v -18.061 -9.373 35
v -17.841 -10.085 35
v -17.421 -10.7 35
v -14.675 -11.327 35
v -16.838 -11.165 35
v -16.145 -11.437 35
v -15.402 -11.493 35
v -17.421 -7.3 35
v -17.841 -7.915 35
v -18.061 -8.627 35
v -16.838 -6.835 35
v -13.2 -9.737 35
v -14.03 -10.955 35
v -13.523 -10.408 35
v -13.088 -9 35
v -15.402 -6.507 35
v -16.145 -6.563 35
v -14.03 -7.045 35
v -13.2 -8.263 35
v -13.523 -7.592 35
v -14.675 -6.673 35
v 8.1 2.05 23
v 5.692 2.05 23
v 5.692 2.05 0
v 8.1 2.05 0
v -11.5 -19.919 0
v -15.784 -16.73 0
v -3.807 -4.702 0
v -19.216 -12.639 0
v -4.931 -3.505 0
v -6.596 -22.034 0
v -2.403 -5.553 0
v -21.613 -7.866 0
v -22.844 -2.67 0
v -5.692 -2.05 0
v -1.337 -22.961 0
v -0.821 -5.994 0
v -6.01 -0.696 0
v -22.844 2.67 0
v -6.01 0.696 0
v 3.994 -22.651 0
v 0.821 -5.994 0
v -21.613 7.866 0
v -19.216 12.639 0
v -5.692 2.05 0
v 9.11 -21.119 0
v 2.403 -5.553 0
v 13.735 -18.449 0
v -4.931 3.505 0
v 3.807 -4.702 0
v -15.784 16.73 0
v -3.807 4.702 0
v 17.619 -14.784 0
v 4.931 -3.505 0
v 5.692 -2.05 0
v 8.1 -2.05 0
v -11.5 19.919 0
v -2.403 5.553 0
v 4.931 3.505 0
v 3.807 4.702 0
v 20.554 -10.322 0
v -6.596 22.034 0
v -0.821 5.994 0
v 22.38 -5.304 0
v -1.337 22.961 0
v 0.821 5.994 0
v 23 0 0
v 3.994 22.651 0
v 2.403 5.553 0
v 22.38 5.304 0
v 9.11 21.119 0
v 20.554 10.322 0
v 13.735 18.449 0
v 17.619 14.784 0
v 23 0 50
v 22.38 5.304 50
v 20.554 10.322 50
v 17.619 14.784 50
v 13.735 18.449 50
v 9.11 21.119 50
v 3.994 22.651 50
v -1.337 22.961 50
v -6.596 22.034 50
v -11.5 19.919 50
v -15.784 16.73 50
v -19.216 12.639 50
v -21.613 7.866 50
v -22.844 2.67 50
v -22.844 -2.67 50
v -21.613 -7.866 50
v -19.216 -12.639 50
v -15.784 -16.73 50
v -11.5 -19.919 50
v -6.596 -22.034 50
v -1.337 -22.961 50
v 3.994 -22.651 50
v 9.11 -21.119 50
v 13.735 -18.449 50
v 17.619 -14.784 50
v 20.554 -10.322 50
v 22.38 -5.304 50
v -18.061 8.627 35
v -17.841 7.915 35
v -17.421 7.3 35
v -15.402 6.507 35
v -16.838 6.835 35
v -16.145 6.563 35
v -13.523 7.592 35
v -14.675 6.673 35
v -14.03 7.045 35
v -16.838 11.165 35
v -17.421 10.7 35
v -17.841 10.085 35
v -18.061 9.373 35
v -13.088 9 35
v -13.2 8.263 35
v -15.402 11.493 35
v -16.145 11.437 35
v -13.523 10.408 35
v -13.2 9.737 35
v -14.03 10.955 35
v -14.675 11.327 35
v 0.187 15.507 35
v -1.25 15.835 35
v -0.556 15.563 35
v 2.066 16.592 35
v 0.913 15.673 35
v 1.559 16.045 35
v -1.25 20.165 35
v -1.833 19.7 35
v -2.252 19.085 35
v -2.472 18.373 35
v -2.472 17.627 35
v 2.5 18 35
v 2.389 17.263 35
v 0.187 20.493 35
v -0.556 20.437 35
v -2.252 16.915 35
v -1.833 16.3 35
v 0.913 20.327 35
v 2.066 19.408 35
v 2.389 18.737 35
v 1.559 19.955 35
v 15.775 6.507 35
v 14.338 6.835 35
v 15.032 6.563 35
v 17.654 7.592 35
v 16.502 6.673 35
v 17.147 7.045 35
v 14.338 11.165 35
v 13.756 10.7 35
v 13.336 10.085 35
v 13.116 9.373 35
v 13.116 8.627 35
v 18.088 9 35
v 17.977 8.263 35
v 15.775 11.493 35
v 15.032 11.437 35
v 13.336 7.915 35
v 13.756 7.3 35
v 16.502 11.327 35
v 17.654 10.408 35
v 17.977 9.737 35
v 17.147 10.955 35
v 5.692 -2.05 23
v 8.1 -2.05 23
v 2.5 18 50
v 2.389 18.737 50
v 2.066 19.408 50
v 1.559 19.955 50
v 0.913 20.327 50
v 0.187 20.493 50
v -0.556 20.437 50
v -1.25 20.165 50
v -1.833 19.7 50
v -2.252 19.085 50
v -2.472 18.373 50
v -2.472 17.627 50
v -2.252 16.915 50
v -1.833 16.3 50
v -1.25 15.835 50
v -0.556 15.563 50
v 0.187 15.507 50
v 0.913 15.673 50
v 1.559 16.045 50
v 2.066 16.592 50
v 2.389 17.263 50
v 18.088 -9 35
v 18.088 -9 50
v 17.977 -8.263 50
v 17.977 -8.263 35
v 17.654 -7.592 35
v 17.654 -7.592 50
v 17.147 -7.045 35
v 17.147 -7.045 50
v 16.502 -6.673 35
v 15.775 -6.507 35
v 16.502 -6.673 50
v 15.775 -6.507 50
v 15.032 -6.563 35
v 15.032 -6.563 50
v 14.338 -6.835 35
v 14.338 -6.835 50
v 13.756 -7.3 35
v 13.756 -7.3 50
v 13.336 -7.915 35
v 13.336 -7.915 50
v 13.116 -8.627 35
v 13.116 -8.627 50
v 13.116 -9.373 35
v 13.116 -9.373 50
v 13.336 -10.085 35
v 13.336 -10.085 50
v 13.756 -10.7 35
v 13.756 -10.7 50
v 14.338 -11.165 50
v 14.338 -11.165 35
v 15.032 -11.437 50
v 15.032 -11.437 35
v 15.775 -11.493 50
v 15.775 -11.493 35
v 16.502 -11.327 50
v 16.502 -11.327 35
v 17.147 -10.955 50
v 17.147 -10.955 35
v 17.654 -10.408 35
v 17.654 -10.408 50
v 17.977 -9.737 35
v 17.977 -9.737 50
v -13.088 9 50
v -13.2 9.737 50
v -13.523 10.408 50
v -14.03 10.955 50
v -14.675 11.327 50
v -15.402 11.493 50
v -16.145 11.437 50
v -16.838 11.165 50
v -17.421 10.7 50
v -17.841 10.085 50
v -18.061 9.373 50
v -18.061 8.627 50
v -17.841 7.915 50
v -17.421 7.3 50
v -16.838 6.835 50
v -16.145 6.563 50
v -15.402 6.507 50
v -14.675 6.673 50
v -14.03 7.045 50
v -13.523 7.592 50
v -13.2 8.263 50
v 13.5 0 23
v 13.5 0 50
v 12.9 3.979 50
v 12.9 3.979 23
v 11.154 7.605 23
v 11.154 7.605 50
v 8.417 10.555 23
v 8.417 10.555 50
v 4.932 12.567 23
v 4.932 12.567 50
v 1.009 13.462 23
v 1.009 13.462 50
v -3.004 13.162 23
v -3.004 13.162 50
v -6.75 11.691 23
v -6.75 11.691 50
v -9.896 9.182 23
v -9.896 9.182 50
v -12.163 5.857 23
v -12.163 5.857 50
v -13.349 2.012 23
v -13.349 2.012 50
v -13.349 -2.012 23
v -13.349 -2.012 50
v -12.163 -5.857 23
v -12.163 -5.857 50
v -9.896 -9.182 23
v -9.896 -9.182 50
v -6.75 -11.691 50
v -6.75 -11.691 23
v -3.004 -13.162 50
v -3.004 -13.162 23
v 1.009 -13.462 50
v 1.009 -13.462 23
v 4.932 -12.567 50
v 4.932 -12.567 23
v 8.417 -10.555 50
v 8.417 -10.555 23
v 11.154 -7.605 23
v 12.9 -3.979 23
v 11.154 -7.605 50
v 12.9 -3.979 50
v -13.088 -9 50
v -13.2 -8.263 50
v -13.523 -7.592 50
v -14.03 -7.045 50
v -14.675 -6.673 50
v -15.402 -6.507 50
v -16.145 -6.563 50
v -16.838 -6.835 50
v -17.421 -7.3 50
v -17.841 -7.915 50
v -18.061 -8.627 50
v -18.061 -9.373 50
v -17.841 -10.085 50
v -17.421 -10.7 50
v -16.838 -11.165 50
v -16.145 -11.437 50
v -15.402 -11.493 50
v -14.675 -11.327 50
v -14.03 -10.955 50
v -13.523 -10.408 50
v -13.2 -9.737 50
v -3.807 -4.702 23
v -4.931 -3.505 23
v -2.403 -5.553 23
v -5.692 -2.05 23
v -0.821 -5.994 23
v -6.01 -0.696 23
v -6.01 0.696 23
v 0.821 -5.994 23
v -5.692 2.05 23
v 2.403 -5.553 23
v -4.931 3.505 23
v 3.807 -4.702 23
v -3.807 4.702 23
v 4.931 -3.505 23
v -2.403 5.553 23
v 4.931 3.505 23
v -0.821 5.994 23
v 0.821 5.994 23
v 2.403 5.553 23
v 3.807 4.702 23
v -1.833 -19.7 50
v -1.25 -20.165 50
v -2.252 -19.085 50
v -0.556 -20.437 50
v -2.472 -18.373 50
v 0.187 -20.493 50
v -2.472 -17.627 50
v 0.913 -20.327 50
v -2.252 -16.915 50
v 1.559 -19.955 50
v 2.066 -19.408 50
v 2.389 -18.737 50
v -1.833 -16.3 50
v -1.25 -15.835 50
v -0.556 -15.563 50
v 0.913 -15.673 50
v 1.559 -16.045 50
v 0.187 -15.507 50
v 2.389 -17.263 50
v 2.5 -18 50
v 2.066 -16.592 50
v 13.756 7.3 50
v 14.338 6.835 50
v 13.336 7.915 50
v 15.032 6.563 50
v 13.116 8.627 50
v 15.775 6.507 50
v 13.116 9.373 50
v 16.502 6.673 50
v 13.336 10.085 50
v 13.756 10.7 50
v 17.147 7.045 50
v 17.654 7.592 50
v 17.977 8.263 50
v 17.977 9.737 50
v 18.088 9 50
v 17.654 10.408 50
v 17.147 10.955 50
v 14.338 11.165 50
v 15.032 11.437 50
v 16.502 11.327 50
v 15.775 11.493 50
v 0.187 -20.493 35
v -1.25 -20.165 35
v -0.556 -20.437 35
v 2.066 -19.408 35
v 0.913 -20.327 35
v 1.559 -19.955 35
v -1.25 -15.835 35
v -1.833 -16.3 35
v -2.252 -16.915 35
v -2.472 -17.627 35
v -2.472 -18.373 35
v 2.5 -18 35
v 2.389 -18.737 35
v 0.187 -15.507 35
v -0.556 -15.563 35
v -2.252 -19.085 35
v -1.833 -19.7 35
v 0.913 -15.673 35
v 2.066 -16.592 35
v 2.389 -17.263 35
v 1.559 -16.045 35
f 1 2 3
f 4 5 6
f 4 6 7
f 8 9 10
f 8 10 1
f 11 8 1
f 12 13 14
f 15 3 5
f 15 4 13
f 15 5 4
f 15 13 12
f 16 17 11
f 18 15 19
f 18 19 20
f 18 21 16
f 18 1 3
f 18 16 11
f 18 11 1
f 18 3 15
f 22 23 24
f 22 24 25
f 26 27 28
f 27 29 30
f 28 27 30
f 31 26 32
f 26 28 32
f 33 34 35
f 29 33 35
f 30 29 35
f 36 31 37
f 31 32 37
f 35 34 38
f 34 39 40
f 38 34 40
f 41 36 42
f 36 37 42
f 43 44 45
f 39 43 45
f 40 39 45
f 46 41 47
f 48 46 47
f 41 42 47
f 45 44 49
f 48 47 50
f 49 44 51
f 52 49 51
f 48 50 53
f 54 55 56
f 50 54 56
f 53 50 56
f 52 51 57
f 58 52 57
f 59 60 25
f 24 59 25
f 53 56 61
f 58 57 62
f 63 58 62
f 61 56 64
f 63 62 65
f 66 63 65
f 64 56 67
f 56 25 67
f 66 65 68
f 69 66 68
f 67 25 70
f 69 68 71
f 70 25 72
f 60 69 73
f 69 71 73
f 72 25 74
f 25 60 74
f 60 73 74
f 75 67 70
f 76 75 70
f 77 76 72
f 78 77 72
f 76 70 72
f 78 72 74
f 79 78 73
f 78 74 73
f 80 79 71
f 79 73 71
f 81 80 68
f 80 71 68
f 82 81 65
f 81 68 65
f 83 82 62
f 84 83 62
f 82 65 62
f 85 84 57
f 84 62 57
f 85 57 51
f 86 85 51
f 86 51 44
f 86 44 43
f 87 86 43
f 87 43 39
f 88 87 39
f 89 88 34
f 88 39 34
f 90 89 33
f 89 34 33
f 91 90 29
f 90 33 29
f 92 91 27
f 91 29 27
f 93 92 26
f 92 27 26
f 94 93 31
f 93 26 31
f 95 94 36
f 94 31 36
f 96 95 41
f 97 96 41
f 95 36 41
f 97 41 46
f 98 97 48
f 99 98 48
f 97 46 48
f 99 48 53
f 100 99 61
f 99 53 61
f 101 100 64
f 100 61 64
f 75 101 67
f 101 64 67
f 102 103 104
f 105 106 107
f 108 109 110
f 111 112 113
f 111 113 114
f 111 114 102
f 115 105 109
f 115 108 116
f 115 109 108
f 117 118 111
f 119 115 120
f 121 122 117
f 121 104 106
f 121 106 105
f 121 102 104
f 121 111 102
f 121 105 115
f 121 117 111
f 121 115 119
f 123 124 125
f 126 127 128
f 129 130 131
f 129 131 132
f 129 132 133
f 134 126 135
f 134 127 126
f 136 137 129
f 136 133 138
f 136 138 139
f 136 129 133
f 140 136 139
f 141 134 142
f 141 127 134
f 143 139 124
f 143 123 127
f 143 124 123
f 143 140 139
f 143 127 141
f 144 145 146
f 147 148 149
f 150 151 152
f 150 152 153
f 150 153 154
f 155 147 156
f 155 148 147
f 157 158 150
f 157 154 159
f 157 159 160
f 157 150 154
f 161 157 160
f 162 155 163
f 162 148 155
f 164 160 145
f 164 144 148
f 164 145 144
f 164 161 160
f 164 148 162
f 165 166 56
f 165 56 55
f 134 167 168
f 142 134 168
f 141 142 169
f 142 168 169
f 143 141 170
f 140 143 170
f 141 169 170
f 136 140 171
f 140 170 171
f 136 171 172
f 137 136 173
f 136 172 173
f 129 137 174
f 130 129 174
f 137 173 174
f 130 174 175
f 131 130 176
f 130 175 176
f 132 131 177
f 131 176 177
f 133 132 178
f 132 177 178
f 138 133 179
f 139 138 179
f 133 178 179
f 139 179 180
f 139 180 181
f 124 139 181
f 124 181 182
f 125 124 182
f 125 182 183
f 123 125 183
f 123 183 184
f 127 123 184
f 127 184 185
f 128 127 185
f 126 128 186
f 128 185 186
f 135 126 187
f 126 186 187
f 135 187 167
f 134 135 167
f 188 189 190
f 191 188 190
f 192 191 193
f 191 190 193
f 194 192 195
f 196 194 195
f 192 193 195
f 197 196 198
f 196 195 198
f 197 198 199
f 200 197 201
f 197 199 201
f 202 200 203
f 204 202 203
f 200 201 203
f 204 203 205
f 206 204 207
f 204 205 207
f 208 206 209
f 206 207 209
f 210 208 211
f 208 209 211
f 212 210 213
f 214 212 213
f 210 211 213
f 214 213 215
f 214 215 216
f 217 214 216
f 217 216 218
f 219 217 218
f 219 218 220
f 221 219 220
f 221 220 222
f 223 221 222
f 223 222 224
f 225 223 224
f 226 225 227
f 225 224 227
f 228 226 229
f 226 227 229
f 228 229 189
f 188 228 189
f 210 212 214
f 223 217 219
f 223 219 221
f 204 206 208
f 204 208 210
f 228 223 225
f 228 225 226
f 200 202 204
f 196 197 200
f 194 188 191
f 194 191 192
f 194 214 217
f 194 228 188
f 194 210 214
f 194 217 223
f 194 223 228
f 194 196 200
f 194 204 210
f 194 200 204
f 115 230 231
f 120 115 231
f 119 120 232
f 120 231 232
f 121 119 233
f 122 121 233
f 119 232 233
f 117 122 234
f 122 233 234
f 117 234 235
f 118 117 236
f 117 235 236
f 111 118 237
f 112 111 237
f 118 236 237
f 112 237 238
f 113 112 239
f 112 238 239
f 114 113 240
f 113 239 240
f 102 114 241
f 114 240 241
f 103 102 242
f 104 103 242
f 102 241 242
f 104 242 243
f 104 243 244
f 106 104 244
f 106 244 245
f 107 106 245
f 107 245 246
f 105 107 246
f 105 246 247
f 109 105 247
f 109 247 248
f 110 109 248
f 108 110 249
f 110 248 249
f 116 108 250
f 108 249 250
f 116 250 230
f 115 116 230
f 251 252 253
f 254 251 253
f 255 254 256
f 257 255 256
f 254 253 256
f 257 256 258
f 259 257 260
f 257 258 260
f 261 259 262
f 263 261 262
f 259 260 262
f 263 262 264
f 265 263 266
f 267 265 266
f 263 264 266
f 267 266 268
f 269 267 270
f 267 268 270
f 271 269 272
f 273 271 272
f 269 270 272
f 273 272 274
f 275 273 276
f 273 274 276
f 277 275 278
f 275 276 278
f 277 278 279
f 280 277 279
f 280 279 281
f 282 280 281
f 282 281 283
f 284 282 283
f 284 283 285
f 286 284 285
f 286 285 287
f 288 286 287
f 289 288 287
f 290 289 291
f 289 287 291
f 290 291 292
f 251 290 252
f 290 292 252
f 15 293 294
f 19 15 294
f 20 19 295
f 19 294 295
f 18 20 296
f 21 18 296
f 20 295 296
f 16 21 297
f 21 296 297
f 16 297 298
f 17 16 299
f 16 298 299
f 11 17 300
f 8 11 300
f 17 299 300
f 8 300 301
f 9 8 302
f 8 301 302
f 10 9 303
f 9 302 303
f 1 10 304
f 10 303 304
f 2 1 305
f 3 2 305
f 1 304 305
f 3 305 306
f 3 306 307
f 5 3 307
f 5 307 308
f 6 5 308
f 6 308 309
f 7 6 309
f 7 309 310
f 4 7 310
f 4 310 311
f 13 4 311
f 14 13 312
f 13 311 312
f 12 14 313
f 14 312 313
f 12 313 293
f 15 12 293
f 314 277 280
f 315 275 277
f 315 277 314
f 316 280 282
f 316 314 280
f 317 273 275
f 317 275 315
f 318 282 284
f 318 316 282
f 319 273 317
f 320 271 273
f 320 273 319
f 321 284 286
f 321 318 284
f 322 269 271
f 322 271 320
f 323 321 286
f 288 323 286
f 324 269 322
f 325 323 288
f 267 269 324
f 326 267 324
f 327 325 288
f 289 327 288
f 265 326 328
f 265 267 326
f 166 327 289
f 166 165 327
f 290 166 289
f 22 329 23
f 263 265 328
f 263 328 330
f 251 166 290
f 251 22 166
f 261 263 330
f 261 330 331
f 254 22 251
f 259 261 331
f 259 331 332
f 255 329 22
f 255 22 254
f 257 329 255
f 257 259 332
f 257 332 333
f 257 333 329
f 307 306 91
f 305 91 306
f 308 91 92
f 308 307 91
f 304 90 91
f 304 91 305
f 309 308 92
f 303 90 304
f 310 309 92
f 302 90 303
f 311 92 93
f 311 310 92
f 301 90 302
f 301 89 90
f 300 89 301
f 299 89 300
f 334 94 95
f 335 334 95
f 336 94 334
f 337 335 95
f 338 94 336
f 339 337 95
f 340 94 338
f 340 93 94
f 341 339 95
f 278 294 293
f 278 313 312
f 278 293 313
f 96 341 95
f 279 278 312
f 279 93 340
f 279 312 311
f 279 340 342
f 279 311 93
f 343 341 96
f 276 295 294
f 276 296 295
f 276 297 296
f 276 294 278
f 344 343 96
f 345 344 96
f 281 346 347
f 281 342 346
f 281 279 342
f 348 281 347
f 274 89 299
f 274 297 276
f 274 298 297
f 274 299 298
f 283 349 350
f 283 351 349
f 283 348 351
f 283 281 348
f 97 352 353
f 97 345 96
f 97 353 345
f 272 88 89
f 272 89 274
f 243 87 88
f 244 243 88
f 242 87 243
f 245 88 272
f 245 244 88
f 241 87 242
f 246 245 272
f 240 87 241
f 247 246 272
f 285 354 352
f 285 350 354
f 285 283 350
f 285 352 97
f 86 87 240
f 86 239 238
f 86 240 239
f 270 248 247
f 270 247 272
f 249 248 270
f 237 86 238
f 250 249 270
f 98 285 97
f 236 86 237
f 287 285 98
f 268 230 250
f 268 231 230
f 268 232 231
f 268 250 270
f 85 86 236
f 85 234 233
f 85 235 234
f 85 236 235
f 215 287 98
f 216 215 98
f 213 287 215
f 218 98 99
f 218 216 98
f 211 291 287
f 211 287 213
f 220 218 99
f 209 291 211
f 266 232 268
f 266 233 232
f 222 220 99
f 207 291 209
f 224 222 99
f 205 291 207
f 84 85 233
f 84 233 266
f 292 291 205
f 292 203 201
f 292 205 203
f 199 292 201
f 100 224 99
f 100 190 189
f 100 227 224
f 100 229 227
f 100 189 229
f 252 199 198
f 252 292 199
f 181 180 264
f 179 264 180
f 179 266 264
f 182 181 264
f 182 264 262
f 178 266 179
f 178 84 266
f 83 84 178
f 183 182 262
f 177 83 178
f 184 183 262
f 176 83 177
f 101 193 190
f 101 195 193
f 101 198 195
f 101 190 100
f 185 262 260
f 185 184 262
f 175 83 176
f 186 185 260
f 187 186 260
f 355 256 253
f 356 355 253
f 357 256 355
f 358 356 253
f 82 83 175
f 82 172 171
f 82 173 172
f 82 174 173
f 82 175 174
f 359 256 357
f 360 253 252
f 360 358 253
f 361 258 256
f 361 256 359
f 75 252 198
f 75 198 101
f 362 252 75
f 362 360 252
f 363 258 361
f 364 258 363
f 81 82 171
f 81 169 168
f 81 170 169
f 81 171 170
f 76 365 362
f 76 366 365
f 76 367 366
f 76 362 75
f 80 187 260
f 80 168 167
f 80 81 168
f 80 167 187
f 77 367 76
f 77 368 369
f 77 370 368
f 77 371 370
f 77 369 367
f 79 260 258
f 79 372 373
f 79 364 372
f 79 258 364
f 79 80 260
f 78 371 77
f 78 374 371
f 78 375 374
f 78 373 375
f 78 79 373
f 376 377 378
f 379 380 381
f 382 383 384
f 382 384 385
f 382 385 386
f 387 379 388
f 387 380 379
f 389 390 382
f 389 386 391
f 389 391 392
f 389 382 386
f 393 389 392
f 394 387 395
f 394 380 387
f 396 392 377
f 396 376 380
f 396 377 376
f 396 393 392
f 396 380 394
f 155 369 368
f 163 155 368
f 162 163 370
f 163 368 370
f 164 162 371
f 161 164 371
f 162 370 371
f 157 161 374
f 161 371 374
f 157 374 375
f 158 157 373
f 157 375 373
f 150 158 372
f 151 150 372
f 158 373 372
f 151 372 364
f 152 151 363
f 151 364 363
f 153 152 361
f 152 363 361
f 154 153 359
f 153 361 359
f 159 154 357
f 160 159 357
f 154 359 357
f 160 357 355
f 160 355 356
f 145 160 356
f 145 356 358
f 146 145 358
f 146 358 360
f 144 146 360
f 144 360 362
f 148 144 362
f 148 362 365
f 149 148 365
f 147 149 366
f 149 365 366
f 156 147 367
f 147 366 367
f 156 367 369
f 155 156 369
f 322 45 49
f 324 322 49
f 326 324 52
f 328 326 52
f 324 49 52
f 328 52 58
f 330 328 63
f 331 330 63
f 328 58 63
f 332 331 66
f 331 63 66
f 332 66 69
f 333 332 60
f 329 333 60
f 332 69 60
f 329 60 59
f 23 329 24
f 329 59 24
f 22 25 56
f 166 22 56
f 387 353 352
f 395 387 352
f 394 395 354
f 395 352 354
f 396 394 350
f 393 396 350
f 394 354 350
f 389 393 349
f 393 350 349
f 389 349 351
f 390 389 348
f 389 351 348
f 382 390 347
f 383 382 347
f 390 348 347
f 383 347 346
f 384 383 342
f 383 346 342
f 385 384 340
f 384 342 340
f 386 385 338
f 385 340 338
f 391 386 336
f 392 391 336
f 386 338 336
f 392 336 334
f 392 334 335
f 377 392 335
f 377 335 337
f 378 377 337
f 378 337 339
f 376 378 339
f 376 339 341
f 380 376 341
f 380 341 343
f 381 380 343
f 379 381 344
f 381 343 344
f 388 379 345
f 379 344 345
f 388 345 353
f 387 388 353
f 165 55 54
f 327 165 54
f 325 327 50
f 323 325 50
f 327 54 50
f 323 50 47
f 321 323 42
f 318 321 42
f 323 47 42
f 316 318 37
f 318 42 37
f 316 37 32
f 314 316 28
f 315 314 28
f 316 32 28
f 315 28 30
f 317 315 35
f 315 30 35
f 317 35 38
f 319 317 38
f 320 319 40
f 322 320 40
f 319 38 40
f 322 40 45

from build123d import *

# Parameters (mm, degrees)
F0_R     = 23
F3_DEPTH = 50
F4_R     = 13.5
F1_DEPTH = 27
F5_R     = 2.5
F2_DEPTH = 15


with BuildPart() as f3:
    # F0 (on Top) → F3 (new body)
    with BuildSketch(Plane.XY):
        Circle(F0_R)
        with BuildLine():
            ThreePointArc((-5.6921, 2.05), (0, 6.05), (5.6921, 2.05))
            Line((5.6921, 2.05), (8.1, 2.05))
            Line((8.1, 2.05), (8.1, -2.05))
            Line((8.1, -2.05), (5.6921, -2.05))
            ThreePointArc((5.6921, -2.05), (0, -6.05), (-5.6921, -2.05))
            Line((-5.6921, -2.05), (-8.1, -2.05))
            Line((-8.1, -2.05), (-8.1, 2.05))
            Line((-8.1, 2.05), (-5.6921, 2.05))
        make_face(mode=Mode.SUBTRACT)
        with BuildLine():
            ThreePointArc((-5.6921, -2.05), (-6.05, 0), (-5.6921, 2.05))
            Line((-5.6921, 2.05), (-8.1, 2.05))
            Line((-8.1, 2.05), (-8.1, -2.05))
            Line((-8.1, -2.05), (-5.6921, -2.05))
        make_face()
    extrude(amount=F3_DEPTH)

    # F4 (on face) → F1 (cut)
    with BuildSketch(Plane.XY.offset(50)):
        Circle(F4_R)
    extrude(amount=-F1_DEPTH, mode=Mode.SUBTRACT)

    # F5 (on face) → F2 (cut)
    with BuildSketch(Plane.XY.offset(50)):
        with Locations((15.588457, 9)):
            Circle(F5_R)
        with Locations((0, 18)):
            Circle(F5_R)
        with Locations((-15.588457, 9)):
            Circle(F5_R)
        with Locations((15.588457, -9)):
            Circle(F5_R)
        with Locations((0, -18)):
            Circle(F5_R)
        with Locations((-15.588457, -9)):
            Circle(F5_R)
    extrude(amount=-F2_DEPTH, mode=Mode.SUBTRACT)


solid = f3.part
